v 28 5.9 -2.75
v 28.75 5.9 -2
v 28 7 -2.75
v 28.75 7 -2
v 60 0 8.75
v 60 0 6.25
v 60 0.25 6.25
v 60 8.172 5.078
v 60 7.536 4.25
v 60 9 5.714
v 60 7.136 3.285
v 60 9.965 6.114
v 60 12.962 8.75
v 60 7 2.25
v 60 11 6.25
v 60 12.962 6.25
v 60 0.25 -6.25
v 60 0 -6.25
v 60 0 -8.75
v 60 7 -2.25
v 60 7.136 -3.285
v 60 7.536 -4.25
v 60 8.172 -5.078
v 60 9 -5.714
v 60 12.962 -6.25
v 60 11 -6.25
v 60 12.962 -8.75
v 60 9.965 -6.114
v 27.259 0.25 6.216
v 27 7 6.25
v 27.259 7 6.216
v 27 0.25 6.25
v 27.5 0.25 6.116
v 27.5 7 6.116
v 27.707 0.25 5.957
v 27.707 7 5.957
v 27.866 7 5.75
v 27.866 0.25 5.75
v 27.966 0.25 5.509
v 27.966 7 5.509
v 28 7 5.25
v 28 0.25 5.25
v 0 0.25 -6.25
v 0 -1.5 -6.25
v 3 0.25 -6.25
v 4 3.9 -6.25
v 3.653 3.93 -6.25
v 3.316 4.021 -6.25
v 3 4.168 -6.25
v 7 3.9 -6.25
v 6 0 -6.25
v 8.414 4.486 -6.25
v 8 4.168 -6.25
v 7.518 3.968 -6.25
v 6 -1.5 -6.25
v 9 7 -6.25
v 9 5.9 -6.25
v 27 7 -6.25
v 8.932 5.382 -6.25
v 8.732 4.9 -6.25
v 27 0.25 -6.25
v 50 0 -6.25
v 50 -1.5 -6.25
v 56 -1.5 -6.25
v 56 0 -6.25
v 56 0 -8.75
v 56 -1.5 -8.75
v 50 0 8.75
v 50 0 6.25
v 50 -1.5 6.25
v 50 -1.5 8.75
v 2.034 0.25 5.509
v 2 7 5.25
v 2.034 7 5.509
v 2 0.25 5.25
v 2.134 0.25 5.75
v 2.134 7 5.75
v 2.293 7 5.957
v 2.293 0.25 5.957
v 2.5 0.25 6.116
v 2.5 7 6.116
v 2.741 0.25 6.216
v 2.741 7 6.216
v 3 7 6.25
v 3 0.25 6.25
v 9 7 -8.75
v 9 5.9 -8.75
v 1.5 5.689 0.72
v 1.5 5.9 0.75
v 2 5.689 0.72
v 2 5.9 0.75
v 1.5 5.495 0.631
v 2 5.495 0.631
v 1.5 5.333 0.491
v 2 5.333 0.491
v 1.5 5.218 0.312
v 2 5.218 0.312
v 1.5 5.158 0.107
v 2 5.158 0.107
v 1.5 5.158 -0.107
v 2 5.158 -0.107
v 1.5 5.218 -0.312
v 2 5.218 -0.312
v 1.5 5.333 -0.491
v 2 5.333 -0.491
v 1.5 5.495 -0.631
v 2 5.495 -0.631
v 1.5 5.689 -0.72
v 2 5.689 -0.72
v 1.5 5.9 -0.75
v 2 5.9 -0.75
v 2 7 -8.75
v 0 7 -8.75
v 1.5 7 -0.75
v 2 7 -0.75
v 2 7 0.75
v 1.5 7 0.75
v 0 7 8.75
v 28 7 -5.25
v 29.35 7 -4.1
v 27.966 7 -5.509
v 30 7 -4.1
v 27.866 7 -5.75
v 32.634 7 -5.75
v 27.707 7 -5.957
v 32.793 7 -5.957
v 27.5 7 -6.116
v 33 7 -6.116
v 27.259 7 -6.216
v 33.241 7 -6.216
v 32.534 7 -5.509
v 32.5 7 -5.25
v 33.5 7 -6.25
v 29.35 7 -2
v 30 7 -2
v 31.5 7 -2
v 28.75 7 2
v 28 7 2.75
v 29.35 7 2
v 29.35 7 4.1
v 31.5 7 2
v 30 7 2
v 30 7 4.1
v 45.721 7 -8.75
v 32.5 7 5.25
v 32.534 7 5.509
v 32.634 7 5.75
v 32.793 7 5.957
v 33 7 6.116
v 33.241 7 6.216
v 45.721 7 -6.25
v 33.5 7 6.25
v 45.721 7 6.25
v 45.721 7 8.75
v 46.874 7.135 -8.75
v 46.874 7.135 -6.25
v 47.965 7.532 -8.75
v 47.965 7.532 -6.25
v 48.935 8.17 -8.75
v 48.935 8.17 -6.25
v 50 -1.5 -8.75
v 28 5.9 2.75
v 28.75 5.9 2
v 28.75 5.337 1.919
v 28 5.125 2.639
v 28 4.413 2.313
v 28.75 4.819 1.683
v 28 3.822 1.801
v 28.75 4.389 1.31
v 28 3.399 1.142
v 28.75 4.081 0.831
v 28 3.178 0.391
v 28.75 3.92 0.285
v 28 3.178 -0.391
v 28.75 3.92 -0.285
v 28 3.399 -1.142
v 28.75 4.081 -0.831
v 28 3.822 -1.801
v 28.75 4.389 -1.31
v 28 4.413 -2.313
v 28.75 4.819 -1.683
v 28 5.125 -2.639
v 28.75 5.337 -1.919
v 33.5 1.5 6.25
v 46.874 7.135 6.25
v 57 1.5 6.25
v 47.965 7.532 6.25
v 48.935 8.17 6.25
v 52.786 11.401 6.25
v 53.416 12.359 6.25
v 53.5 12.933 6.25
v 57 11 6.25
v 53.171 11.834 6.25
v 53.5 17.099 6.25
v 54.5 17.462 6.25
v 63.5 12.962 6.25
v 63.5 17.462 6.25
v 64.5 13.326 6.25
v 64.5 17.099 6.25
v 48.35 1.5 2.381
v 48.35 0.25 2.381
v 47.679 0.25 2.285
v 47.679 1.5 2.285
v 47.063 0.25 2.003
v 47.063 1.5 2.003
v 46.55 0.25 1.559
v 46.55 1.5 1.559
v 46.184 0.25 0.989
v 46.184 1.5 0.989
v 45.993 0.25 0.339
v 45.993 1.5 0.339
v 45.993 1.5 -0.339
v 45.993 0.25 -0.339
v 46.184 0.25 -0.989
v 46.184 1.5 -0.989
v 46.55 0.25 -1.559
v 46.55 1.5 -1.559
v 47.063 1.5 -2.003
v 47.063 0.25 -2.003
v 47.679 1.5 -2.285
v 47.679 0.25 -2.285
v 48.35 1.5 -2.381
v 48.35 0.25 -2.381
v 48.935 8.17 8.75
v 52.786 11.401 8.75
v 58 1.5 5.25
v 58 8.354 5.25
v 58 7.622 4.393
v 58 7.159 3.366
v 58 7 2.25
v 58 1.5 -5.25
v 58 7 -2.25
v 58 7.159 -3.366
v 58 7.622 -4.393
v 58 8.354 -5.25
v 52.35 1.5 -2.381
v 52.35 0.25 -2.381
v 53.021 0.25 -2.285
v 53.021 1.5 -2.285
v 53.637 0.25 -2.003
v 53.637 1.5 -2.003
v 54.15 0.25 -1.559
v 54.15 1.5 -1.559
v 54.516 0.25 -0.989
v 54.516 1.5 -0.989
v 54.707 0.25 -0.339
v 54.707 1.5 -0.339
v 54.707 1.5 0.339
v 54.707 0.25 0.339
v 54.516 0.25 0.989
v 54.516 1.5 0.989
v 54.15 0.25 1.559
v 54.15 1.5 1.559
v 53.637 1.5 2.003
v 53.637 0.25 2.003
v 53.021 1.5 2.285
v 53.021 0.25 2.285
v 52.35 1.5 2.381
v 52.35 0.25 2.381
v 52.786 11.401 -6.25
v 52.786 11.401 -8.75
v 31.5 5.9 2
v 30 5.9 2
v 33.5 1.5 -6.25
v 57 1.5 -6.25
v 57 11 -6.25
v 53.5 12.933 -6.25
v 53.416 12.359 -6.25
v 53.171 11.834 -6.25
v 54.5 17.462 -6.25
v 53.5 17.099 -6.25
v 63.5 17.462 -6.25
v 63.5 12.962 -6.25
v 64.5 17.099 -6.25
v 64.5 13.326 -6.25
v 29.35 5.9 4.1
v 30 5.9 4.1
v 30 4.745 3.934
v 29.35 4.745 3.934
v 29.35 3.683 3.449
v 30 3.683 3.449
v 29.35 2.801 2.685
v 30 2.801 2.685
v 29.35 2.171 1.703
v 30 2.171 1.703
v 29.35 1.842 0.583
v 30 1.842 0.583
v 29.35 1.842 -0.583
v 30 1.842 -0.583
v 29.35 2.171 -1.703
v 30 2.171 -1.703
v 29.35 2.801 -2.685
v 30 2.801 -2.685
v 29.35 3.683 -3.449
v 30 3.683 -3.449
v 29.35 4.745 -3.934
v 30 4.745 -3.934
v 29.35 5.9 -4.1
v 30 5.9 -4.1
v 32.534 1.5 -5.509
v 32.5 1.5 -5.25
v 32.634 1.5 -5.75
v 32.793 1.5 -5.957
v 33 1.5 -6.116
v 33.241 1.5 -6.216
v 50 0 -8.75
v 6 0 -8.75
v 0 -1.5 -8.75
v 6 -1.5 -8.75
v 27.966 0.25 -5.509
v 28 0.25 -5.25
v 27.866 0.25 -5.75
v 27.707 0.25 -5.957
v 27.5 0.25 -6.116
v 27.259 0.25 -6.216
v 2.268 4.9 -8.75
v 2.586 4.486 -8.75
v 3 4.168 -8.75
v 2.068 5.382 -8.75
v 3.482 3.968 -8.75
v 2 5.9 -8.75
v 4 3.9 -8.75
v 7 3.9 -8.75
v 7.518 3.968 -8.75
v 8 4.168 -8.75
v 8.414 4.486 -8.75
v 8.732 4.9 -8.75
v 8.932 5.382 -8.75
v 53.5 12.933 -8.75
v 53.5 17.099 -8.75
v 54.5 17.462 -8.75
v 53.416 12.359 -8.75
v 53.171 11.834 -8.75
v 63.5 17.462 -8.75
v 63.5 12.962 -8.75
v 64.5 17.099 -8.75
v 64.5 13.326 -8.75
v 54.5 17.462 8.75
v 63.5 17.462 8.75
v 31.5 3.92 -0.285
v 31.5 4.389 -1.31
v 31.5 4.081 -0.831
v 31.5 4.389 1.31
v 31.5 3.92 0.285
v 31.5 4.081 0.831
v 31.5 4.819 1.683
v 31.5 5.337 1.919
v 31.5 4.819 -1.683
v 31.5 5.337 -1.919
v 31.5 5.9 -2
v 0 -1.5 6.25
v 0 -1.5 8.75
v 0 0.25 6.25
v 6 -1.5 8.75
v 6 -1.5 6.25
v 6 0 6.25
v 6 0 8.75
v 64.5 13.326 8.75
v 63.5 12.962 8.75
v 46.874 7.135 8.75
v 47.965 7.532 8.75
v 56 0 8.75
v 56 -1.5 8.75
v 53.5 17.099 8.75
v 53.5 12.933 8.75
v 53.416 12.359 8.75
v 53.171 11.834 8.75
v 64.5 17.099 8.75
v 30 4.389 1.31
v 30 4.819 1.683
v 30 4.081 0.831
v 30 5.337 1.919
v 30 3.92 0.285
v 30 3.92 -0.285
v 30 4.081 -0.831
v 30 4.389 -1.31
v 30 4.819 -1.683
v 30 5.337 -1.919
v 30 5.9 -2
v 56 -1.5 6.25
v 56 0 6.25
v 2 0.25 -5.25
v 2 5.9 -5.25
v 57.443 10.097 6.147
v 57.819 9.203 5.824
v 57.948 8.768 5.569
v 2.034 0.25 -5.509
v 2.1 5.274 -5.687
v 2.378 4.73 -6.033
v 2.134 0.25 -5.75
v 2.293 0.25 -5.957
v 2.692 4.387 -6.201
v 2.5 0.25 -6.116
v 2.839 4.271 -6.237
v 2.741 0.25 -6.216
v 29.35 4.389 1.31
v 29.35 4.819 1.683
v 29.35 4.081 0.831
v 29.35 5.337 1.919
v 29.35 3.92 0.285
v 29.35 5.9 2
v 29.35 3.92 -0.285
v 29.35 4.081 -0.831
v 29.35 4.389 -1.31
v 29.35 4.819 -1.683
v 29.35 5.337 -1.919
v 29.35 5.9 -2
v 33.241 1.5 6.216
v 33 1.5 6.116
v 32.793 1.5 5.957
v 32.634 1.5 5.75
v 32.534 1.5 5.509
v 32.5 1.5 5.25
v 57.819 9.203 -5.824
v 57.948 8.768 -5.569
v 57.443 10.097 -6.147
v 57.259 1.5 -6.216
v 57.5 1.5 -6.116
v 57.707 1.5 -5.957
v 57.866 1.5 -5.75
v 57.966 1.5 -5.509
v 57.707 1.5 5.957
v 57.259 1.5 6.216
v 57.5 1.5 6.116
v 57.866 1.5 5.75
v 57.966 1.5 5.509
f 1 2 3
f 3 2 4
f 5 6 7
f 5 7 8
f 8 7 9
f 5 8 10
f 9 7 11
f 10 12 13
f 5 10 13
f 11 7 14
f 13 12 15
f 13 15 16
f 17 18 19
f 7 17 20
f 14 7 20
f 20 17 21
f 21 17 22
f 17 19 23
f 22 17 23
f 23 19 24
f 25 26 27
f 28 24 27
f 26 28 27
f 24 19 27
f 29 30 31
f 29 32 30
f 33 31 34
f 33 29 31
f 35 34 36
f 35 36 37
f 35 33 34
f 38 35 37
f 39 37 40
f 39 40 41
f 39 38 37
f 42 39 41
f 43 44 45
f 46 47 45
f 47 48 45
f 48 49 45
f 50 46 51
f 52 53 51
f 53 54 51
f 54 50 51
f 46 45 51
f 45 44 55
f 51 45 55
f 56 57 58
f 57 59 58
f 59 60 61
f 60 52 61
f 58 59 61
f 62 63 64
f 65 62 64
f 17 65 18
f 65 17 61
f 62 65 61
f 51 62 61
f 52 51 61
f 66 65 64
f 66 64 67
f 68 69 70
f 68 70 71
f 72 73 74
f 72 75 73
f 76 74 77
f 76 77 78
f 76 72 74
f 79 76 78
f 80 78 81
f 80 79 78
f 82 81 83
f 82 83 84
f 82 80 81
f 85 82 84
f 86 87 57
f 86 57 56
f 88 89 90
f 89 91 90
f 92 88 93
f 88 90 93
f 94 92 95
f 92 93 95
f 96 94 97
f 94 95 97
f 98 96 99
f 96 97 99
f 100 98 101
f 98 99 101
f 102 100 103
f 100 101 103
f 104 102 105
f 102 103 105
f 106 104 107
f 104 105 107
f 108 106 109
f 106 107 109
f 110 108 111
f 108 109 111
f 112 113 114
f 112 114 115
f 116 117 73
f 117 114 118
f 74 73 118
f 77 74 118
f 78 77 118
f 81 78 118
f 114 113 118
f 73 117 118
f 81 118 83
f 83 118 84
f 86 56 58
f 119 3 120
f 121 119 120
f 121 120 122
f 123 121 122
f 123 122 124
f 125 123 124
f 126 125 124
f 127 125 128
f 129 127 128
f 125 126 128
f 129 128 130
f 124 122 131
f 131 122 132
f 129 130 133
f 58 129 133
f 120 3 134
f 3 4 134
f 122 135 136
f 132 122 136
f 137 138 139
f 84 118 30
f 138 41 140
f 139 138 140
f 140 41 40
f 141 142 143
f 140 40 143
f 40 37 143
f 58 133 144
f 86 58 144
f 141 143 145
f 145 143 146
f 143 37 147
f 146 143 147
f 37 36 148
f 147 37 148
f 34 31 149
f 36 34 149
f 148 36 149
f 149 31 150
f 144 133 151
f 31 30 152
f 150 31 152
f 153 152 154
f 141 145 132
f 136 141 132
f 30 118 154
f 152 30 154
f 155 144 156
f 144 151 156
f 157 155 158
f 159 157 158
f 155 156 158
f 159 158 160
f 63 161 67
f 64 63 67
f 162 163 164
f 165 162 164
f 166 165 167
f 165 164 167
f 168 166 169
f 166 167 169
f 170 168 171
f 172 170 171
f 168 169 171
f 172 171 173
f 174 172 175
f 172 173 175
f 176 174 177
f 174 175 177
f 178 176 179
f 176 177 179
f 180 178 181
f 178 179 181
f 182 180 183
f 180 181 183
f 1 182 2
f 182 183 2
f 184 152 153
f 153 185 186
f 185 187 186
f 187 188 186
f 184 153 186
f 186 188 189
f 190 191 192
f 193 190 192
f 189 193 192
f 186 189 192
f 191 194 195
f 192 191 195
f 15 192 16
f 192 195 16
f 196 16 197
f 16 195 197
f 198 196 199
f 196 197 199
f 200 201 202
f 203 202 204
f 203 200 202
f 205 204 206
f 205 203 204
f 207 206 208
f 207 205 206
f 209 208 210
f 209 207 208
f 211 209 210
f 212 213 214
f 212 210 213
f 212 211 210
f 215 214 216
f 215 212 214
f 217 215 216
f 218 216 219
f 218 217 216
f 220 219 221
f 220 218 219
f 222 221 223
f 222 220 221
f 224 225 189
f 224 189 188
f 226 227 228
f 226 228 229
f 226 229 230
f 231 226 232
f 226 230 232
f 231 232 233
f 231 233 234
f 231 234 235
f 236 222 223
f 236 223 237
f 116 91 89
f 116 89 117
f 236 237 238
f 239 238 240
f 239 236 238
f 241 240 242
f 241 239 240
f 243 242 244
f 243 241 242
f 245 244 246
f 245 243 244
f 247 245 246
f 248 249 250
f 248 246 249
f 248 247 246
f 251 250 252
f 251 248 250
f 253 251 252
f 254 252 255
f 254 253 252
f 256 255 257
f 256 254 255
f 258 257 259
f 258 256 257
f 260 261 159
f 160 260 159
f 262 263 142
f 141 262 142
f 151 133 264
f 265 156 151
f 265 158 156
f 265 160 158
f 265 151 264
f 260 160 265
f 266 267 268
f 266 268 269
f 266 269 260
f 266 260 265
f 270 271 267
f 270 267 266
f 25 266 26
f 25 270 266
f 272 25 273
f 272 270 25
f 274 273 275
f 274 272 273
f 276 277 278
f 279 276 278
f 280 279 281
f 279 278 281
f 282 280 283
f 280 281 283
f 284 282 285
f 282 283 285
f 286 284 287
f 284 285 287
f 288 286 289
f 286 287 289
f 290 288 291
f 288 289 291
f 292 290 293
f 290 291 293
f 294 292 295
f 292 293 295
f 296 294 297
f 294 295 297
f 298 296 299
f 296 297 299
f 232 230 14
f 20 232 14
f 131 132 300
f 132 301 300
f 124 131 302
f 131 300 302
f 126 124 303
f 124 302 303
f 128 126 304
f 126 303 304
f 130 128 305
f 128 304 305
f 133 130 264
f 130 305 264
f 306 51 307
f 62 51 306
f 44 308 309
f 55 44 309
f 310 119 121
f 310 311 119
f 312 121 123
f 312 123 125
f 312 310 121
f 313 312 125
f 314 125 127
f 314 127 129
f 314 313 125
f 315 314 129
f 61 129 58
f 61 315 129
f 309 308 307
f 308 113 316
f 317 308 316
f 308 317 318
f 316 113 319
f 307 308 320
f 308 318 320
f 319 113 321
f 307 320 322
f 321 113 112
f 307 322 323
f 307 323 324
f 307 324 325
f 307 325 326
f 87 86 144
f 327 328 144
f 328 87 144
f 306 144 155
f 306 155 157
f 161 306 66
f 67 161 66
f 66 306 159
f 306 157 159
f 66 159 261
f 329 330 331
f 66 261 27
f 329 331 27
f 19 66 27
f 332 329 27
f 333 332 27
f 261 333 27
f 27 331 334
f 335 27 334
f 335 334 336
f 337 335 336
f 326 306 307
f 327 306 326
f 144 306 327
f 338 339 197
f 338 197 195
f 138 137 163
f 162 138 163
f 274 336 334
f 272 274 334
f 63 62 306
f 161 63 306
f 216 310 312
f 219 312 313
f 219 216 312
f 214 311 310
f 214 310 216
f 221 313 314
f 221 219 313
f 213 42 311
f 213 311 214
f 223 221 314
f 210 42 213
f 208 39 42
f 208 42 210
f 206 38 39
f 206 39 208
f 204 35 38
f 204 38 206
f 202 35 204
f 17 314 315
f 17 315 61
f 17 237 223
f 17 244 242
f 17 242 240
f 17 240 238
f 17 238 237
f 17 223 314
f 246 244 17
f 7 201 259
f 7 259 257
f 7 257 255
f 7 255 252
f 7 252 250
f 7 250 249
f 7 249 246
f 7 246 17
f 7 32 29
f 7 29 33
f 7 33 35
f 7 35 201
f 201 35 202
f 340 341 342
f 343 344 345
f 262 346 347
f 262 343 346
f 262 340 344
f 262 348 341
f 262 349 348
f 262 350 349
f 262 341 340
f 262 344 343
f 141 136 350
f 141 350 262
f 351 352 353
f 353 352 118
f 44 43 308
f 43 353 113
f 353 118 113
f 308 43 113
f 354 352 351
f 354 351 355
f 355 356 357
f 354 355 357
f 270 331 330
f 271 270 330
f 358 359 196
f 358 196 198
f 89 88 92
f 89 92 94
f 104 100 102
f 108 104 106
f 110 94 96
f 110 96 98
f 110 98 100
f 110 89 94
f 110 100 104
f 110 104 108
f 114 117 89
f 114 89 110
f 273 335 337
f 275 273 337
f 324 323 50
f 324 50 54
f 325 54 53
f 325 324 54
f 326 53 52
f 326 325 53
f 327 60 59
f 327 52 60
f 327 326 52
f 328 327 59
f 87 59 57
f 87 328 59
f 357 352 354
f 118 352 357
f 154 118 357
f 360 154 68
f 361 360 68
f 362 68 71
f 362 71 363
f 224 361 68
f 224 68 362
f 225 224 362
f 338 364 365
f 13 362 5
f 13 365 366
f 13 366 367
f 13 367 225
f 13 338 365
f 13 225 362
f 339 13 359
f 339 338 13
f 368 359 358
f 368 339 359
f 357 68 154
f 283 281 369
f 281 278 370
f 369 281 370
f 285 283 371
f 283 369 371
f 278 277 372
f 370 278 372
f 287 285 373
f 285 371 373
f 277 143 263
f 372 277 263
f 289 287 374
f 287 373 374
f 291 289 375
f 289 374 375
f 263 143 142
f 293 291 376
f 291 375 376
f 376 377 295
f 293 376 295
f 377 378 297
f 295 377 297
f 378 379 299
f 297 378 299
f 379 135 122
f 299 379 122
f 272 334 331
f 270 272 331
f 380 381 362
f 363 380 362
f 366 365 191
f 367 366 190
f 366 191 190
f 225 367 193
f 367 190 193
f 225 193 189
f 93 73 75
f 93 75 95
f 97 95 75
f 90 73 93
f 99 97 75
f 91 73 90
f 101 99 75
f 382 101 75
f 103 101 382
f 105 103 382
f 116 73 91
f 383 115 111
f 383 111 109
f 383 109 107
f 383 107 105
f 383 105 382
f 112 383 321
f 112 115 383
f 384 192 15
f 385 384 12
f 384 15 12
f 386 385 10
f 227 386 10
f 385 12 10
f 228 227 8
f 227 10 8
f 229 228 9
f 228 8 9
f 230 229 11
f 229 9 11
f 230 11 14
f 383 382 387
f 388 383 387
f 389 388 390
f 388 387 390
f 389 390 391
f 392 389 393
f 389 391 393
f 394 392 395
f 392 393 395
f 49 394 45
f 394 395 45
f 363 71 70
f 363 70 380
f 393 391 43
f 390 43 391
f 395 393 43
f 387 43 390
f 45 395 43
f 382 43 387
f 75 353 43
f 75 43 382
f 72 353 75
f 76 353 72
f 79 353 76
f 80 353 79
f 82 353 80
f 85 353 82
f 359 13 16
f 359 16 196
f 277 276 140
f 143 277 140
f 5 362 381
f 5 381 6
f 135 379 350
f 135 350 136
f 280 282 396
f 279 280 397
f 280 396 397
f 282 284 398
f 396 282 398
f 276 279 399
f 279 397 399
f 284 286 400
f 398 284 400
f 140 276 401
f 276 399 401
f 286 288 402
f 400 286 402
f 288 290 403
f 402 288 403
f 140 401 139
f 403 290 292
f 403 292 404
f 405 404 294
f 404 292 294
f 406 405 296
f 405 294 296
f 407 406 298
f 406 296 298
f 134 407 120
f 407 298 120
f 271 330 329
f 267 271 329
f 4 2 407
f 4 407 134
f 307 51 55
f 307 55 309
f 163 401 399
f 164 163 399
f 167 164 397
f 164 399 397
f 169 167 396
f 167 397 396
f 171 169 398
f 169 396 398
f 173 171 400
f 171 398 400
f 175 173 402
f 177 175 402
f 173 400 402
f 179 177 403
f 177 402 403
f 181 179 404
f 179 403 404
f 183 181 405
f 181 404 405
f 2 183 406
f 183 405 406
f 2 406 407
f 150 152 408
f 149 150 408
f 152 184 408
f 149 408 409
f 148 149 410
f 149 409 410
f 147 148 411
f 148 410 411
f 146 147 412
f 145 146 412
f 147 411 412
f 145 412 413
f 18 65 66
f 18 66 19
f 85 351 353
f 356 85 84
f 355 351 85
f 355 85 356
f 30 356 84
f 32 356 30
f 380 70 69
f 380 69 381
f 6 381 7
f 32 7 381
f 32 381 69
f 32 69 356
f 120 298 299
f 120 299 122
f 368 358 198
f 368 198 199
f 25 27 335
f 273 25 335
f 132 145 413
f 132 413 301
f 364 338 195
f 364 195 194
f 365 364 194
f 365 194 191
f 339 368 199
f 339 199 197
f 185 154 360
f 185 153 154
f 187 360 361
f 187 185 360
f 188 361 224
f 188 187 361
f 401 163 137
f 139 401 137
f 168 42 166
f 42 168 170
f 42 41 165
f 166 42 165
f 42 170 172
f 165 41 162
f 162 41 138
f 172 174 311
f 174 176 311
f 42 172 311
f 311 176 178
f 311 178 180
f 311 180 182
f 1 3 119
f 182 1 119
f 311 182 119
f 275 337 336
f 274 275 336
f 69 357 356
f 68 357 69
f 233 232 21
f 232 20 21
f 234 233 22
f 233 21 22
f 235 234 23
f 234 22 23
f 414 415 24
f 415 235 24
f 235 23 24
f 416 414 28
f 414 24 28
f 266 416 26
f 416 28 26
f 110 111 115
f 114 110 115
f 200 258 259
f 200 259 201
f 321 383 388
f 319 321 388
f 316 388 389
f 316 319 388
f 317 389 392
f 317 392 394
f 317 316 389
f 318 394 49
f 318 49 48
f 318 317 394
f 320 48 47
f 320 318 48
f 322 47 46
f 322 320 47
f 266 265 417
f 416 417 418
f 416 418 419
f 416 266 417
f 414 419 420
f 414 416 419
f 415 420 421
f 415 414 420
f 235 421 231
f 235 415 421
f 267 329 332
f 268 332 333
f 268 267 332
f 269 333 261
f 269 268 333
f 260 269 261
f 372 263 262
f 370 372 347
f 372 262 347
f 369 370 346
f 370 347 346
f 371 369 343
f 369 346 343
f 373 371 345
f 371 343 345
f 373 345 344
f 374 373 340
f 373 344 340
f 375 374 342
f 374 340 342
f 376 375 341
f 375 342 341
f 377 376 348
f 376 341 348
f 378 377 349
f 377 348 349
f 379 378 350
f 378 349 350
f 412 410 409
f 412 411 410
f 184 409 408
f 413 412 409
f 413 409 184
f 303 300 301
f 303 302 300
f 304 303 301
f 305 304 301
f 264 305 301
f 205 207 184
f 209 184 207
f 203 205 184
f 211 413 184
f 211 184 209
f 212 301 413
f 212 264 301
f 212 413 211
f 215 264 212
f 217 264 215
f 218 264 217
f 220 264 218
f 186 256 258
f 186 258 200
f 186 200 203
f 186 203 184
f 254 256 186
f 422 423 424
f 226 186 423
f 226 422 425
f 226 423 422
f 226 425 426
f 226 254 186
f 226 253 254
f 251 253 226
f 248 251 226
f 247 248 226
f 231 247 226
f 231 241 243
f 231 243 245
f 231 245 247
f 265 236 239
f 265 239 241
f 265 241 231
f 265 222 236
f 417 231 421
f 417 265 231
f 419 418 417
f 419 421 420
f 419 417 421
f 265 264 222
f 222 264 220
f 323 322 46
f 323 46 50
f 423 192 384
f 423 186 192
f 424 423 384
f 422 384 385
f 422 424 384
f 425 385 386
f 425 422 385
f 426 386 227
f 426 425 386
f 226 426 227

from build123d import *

# Parameters (mm, degrees)
SKETCH1_W           = 60
SKETCH1_H           = 7
BOSS_EXTRUDE1_DEPTH = 8.75
SKETCH2_W           = 26
SKETCH2_H           = 12.5
CUT_EXTRUDE1_DEPTH  = 8
SKETCH4_W           = 4
SKETCH4_H           = 1.1
CUT_EXTRUDE2_DEPTH  = 3.5
SKETCH5_W           = 8.2
SKETCH5_H           = 1.1
CUT_EXTRUDE4_DEPTH  = 0.65
SKETCH6_W           = 1.5
SKETCH6_H           = 1.1
CUT_EXTRUDE5_DEPTH  = 0.5
BOSS_EXTRUDE2_DEPTH = 2.5
SKETCH9_W           = 6
SKETCH9_H           = 2.5
BOSS_EXTRUDE4_DEPTH = 1.5
SKETCH10_W          = 25.5
SKETCH10_H          = 12.5
CUT_EXTRUDE6_DEPTH  = 5.5
CUT_EXTRUDE7_DEPTH  = 4
SKETCH12_W          = 60
SKETCH12_H          = 12.5
CUT_EXTRUDE8_DEPTH  = 0.25
FILLET1_R           = 4
FILLET2_R           = 5
FILLET3_R           = 1
CUT_EXTRUDE9_DEPTH  = 10
FILLET4_R           = 2
CHAMFER1_SIZE       = 0.75


with BuildPart() as part:
    # Sketch1 → Boss-Extrude1 (new body, symmetric)
    with BuildSketch(Plane.XY):
        with Locations((30, 3.5)):
            Rectangle(SKETCH1_W, SKETCH1_H)
    extrude(amount=BOSS_EXTRUDE1_DEPTH, both=True)

    # Sketch2 → Cut-Extrude1 (cut, through all)
    with BuildSketch(Plane(origin=(0, 7, 0), x_dir=(1, 0, 0), z_dir=(0, 1, 0))):
        with Locations((15, 0)):
            Rectangle(SKETCH2_W, SKETCH2_H)
    extrude(amount=-CUT_EXTRUDE1_DEPTH, mode=Mode.SUBTRACT)

    # Sketch3 → Cut-Revolve5 (revolve, cut)
    with BuildSketch(Plane.XY):
        Polygon((1.5, 5.9), (1.5, 5.15), (28, 5.15), (28, 3.9), (29.35, 3.9), (29.35, 1.8), (30, 1.8), (30, 3.9), (31.5, 3.9), (31.5, 5.9), align=None)
    revolve(axis=Axis((0, 5.9, 0), (1, 0, 0)), mode=Mode.SUBTRACT)

    # Sketch4 → Cut-Extrude2 (cut)
    with BuildSketch(Plane.ZY.offset(-28)):
        with Locations((0, 6.45)):
            Rectangle(SKETCH4_W, SKETCH4_H)
    extrude(amount=-CUT_EXTRUDE2_DEPTH, mode=Mode.SUBTRACT)

    # Sketch5 → Cut-Extrude4 (cut)
    with BuildSketch(Plane(origin=(29.35, 0, 0), x_dir=(0, 0, -1), z_dir=(1, 0, 0))):
        with Locations((0, 6.45)):
            Rectangle(SKETCH5_W, SKETCH5_H)
    extrude(amount=CUT_EXTRUDE4_DEPTH, mode=Mode.SUBTRACT)

    # Sketch6 → Cut-Extrude5 (cut)
    with BuildSketch(Plane(origin=(2, 0, 0), x_dir=(0, 0, -1), z_dir=(1, 0, 0))):
        with Locations((0, 6.45)):
            Rectangle(SKETCH6_W, SKETCH6_H)
    extrude(amount=-CUT_EXTRUDE5_DEPTH, mode=Mode.SUBTRACT)

    # Sketch7 → Boss-Extrude2 (add)
    with BuildSketch(Plane.XY.offset(8.75)):
        Polygon((54.5, 17.4625), (53.5, 17.098529766), (53.5, 12), (47.541232037, 7), (60, 7), (60, 12.9625), (63.5, 12.9625), (64.5, 13.326470234), (64.5, 17.098529766), (63.5, 17.4625), align=None)
    boss_extrude2 = extrude(amount=-BOSS_EXTRUDE2_DEPTH)

    # Sketch9 → Boss-Extrude4 (add)
    with BuildSketch(Plane.XZ):
        with Locations((3, 7.5)):
            Rectangle(SKETCH9_W, SKETCH9_H)
        with Locations((53, 7.5)):
            Rectangle(SKETCH9_W, SKETCH9_H)
    boss_extrude4 = extrude(amount=BOSS_EXTRUDE4_DEPTH)

    # Mirror1: Boss-Extrude2, Boss-Extrude4 across plane
    add(boss_extrude2.mirror(Plane.XY))
    add(boss_extrude4.mirror(Plane.XY))

    # Sketch10 → Cut-Extrude6 (cut)
    with BuildSketch(Plane(origin=(0, 7, 0), x_dir=(1, 0, 0), z_dir=(0, 1, 0))):
        with Locations((45.25, 0)):
            Rectangle(SKETCH10_W, SKETCH10_H)
    extrude(amount=-CUT_EXTRUDE6_DEPTH, mode=Mode.SUBTRACT)

    # Sketch11 → Cut-Extrude7 (cut, through all)
    with BuildSketch(Plane(origin=(0, 1.5, 0), x_dir=(1, 0, 0), z_dir=(0, 1, 0))):
        with BuildLine():
            Line((52.35, -2.38125), (48.35, -2.38125))
            ThreePointArc((48.35, -2.38125), (45.96875, 0), (48.35, 2.38125))
            Line((48.35, 2.38125), (52.35, 2.38125))
            ThreePointArc((52.35, 2.38125), (54.73125, 0), (52.35, -2.38125))
        make_face()
    extrude(amount=-CUT_EXTRUDE7_DEPTH, mode=Mode.SUBTRACT)

    # Sketch12 → Cut-Extrude8 (cut)
    with BuildSketch(Plane.XZ):
        with Locations((30, 0)):
            Rectangle(SKETCH12_W, SKETCH12_H)
    extrude(amount=-CUT_EXTRUDE8_DEPTH, mode=Mode.SUBTRACT)

    # Fillet1
    fillet1_edges = [part.edges().sort_by_distance(p)[0] for p in [
        (59, 7, -6.25),
        (59, 7, 6.25),
    ]]
    fillet(fillet1_edges, radius=FILLET1_R)

    # Fillet2
    fillet2_edges = [part.edges().sort_by_distance(p)[0] for p in [
        (47.541232037, 7, 7.5),
        (47.541232037, 7, -7.5),
    ]]
    fillet(fillet2_edges, radius=FILLET2_R)

    # Fillet3
    fillet3_edges = [part.edges().sort_by_distance(p)[0] for p in [
        (58, 4.25, -6.25),
        (58, 4.25, 6.25),
        (32.5, 4.25, 6.25),
        (32.5, 4.25, -6.25),
        (28, 3.625, 6.25),
        (2, 3.625, 6.25),
        (28, 3.625, -6.25),
        (2, 3.625, -6.25),
    ]]
    fillet(fillet3_edges, radius=FILLET3_R)

    # Sketch13 → Cut-Extrude9 (cut)
    with BuildSketch(Plane(origin=(0, 0, -8.75), x_dir=(-1, 0, 0), z_dir=(0, 0, -1))):
        with BuildLine():
            Line((-2, 7), (-2, 5.9))
            ThreePointArc((-2, 5.9), (-2.585786438, 4.485786438), (-4, 3.9))
            Line((-4, 3.9), (-7, 3.9))
            ThreePointArc((-7, 3.9), (-8.414213562, 4.485786438), (-9, 5.9))
            Line((-9, 5.9), (-9, 7))
            Line((-9, 7), (-2, 7))
        make_face()
    extrude(amount=-CUT_EXTRUDE9_DEPTH, mode=Mode.SUBTRACT)

    # Fillet4
    fillet4_edges = [part.edges().sort_by_distance(p)[0] for p in [
        (53.5, 12, -7.5),
        (53.5, 12, 7.5),
    ]]
    fillet(fillet4_edges, radius=FILLET4_R)

    # Chamfer1
    chamfer1_edges = [part.edges().sort_by_distance(p)[0] for p in [
        (28, 3.9, 0),
        (28, 6.45, 2),
        (28, 6.45, -2),
    ]]
    chamfer(chamfer1_edges, length=CHAMFER1_SIZE)


solid = part.part
